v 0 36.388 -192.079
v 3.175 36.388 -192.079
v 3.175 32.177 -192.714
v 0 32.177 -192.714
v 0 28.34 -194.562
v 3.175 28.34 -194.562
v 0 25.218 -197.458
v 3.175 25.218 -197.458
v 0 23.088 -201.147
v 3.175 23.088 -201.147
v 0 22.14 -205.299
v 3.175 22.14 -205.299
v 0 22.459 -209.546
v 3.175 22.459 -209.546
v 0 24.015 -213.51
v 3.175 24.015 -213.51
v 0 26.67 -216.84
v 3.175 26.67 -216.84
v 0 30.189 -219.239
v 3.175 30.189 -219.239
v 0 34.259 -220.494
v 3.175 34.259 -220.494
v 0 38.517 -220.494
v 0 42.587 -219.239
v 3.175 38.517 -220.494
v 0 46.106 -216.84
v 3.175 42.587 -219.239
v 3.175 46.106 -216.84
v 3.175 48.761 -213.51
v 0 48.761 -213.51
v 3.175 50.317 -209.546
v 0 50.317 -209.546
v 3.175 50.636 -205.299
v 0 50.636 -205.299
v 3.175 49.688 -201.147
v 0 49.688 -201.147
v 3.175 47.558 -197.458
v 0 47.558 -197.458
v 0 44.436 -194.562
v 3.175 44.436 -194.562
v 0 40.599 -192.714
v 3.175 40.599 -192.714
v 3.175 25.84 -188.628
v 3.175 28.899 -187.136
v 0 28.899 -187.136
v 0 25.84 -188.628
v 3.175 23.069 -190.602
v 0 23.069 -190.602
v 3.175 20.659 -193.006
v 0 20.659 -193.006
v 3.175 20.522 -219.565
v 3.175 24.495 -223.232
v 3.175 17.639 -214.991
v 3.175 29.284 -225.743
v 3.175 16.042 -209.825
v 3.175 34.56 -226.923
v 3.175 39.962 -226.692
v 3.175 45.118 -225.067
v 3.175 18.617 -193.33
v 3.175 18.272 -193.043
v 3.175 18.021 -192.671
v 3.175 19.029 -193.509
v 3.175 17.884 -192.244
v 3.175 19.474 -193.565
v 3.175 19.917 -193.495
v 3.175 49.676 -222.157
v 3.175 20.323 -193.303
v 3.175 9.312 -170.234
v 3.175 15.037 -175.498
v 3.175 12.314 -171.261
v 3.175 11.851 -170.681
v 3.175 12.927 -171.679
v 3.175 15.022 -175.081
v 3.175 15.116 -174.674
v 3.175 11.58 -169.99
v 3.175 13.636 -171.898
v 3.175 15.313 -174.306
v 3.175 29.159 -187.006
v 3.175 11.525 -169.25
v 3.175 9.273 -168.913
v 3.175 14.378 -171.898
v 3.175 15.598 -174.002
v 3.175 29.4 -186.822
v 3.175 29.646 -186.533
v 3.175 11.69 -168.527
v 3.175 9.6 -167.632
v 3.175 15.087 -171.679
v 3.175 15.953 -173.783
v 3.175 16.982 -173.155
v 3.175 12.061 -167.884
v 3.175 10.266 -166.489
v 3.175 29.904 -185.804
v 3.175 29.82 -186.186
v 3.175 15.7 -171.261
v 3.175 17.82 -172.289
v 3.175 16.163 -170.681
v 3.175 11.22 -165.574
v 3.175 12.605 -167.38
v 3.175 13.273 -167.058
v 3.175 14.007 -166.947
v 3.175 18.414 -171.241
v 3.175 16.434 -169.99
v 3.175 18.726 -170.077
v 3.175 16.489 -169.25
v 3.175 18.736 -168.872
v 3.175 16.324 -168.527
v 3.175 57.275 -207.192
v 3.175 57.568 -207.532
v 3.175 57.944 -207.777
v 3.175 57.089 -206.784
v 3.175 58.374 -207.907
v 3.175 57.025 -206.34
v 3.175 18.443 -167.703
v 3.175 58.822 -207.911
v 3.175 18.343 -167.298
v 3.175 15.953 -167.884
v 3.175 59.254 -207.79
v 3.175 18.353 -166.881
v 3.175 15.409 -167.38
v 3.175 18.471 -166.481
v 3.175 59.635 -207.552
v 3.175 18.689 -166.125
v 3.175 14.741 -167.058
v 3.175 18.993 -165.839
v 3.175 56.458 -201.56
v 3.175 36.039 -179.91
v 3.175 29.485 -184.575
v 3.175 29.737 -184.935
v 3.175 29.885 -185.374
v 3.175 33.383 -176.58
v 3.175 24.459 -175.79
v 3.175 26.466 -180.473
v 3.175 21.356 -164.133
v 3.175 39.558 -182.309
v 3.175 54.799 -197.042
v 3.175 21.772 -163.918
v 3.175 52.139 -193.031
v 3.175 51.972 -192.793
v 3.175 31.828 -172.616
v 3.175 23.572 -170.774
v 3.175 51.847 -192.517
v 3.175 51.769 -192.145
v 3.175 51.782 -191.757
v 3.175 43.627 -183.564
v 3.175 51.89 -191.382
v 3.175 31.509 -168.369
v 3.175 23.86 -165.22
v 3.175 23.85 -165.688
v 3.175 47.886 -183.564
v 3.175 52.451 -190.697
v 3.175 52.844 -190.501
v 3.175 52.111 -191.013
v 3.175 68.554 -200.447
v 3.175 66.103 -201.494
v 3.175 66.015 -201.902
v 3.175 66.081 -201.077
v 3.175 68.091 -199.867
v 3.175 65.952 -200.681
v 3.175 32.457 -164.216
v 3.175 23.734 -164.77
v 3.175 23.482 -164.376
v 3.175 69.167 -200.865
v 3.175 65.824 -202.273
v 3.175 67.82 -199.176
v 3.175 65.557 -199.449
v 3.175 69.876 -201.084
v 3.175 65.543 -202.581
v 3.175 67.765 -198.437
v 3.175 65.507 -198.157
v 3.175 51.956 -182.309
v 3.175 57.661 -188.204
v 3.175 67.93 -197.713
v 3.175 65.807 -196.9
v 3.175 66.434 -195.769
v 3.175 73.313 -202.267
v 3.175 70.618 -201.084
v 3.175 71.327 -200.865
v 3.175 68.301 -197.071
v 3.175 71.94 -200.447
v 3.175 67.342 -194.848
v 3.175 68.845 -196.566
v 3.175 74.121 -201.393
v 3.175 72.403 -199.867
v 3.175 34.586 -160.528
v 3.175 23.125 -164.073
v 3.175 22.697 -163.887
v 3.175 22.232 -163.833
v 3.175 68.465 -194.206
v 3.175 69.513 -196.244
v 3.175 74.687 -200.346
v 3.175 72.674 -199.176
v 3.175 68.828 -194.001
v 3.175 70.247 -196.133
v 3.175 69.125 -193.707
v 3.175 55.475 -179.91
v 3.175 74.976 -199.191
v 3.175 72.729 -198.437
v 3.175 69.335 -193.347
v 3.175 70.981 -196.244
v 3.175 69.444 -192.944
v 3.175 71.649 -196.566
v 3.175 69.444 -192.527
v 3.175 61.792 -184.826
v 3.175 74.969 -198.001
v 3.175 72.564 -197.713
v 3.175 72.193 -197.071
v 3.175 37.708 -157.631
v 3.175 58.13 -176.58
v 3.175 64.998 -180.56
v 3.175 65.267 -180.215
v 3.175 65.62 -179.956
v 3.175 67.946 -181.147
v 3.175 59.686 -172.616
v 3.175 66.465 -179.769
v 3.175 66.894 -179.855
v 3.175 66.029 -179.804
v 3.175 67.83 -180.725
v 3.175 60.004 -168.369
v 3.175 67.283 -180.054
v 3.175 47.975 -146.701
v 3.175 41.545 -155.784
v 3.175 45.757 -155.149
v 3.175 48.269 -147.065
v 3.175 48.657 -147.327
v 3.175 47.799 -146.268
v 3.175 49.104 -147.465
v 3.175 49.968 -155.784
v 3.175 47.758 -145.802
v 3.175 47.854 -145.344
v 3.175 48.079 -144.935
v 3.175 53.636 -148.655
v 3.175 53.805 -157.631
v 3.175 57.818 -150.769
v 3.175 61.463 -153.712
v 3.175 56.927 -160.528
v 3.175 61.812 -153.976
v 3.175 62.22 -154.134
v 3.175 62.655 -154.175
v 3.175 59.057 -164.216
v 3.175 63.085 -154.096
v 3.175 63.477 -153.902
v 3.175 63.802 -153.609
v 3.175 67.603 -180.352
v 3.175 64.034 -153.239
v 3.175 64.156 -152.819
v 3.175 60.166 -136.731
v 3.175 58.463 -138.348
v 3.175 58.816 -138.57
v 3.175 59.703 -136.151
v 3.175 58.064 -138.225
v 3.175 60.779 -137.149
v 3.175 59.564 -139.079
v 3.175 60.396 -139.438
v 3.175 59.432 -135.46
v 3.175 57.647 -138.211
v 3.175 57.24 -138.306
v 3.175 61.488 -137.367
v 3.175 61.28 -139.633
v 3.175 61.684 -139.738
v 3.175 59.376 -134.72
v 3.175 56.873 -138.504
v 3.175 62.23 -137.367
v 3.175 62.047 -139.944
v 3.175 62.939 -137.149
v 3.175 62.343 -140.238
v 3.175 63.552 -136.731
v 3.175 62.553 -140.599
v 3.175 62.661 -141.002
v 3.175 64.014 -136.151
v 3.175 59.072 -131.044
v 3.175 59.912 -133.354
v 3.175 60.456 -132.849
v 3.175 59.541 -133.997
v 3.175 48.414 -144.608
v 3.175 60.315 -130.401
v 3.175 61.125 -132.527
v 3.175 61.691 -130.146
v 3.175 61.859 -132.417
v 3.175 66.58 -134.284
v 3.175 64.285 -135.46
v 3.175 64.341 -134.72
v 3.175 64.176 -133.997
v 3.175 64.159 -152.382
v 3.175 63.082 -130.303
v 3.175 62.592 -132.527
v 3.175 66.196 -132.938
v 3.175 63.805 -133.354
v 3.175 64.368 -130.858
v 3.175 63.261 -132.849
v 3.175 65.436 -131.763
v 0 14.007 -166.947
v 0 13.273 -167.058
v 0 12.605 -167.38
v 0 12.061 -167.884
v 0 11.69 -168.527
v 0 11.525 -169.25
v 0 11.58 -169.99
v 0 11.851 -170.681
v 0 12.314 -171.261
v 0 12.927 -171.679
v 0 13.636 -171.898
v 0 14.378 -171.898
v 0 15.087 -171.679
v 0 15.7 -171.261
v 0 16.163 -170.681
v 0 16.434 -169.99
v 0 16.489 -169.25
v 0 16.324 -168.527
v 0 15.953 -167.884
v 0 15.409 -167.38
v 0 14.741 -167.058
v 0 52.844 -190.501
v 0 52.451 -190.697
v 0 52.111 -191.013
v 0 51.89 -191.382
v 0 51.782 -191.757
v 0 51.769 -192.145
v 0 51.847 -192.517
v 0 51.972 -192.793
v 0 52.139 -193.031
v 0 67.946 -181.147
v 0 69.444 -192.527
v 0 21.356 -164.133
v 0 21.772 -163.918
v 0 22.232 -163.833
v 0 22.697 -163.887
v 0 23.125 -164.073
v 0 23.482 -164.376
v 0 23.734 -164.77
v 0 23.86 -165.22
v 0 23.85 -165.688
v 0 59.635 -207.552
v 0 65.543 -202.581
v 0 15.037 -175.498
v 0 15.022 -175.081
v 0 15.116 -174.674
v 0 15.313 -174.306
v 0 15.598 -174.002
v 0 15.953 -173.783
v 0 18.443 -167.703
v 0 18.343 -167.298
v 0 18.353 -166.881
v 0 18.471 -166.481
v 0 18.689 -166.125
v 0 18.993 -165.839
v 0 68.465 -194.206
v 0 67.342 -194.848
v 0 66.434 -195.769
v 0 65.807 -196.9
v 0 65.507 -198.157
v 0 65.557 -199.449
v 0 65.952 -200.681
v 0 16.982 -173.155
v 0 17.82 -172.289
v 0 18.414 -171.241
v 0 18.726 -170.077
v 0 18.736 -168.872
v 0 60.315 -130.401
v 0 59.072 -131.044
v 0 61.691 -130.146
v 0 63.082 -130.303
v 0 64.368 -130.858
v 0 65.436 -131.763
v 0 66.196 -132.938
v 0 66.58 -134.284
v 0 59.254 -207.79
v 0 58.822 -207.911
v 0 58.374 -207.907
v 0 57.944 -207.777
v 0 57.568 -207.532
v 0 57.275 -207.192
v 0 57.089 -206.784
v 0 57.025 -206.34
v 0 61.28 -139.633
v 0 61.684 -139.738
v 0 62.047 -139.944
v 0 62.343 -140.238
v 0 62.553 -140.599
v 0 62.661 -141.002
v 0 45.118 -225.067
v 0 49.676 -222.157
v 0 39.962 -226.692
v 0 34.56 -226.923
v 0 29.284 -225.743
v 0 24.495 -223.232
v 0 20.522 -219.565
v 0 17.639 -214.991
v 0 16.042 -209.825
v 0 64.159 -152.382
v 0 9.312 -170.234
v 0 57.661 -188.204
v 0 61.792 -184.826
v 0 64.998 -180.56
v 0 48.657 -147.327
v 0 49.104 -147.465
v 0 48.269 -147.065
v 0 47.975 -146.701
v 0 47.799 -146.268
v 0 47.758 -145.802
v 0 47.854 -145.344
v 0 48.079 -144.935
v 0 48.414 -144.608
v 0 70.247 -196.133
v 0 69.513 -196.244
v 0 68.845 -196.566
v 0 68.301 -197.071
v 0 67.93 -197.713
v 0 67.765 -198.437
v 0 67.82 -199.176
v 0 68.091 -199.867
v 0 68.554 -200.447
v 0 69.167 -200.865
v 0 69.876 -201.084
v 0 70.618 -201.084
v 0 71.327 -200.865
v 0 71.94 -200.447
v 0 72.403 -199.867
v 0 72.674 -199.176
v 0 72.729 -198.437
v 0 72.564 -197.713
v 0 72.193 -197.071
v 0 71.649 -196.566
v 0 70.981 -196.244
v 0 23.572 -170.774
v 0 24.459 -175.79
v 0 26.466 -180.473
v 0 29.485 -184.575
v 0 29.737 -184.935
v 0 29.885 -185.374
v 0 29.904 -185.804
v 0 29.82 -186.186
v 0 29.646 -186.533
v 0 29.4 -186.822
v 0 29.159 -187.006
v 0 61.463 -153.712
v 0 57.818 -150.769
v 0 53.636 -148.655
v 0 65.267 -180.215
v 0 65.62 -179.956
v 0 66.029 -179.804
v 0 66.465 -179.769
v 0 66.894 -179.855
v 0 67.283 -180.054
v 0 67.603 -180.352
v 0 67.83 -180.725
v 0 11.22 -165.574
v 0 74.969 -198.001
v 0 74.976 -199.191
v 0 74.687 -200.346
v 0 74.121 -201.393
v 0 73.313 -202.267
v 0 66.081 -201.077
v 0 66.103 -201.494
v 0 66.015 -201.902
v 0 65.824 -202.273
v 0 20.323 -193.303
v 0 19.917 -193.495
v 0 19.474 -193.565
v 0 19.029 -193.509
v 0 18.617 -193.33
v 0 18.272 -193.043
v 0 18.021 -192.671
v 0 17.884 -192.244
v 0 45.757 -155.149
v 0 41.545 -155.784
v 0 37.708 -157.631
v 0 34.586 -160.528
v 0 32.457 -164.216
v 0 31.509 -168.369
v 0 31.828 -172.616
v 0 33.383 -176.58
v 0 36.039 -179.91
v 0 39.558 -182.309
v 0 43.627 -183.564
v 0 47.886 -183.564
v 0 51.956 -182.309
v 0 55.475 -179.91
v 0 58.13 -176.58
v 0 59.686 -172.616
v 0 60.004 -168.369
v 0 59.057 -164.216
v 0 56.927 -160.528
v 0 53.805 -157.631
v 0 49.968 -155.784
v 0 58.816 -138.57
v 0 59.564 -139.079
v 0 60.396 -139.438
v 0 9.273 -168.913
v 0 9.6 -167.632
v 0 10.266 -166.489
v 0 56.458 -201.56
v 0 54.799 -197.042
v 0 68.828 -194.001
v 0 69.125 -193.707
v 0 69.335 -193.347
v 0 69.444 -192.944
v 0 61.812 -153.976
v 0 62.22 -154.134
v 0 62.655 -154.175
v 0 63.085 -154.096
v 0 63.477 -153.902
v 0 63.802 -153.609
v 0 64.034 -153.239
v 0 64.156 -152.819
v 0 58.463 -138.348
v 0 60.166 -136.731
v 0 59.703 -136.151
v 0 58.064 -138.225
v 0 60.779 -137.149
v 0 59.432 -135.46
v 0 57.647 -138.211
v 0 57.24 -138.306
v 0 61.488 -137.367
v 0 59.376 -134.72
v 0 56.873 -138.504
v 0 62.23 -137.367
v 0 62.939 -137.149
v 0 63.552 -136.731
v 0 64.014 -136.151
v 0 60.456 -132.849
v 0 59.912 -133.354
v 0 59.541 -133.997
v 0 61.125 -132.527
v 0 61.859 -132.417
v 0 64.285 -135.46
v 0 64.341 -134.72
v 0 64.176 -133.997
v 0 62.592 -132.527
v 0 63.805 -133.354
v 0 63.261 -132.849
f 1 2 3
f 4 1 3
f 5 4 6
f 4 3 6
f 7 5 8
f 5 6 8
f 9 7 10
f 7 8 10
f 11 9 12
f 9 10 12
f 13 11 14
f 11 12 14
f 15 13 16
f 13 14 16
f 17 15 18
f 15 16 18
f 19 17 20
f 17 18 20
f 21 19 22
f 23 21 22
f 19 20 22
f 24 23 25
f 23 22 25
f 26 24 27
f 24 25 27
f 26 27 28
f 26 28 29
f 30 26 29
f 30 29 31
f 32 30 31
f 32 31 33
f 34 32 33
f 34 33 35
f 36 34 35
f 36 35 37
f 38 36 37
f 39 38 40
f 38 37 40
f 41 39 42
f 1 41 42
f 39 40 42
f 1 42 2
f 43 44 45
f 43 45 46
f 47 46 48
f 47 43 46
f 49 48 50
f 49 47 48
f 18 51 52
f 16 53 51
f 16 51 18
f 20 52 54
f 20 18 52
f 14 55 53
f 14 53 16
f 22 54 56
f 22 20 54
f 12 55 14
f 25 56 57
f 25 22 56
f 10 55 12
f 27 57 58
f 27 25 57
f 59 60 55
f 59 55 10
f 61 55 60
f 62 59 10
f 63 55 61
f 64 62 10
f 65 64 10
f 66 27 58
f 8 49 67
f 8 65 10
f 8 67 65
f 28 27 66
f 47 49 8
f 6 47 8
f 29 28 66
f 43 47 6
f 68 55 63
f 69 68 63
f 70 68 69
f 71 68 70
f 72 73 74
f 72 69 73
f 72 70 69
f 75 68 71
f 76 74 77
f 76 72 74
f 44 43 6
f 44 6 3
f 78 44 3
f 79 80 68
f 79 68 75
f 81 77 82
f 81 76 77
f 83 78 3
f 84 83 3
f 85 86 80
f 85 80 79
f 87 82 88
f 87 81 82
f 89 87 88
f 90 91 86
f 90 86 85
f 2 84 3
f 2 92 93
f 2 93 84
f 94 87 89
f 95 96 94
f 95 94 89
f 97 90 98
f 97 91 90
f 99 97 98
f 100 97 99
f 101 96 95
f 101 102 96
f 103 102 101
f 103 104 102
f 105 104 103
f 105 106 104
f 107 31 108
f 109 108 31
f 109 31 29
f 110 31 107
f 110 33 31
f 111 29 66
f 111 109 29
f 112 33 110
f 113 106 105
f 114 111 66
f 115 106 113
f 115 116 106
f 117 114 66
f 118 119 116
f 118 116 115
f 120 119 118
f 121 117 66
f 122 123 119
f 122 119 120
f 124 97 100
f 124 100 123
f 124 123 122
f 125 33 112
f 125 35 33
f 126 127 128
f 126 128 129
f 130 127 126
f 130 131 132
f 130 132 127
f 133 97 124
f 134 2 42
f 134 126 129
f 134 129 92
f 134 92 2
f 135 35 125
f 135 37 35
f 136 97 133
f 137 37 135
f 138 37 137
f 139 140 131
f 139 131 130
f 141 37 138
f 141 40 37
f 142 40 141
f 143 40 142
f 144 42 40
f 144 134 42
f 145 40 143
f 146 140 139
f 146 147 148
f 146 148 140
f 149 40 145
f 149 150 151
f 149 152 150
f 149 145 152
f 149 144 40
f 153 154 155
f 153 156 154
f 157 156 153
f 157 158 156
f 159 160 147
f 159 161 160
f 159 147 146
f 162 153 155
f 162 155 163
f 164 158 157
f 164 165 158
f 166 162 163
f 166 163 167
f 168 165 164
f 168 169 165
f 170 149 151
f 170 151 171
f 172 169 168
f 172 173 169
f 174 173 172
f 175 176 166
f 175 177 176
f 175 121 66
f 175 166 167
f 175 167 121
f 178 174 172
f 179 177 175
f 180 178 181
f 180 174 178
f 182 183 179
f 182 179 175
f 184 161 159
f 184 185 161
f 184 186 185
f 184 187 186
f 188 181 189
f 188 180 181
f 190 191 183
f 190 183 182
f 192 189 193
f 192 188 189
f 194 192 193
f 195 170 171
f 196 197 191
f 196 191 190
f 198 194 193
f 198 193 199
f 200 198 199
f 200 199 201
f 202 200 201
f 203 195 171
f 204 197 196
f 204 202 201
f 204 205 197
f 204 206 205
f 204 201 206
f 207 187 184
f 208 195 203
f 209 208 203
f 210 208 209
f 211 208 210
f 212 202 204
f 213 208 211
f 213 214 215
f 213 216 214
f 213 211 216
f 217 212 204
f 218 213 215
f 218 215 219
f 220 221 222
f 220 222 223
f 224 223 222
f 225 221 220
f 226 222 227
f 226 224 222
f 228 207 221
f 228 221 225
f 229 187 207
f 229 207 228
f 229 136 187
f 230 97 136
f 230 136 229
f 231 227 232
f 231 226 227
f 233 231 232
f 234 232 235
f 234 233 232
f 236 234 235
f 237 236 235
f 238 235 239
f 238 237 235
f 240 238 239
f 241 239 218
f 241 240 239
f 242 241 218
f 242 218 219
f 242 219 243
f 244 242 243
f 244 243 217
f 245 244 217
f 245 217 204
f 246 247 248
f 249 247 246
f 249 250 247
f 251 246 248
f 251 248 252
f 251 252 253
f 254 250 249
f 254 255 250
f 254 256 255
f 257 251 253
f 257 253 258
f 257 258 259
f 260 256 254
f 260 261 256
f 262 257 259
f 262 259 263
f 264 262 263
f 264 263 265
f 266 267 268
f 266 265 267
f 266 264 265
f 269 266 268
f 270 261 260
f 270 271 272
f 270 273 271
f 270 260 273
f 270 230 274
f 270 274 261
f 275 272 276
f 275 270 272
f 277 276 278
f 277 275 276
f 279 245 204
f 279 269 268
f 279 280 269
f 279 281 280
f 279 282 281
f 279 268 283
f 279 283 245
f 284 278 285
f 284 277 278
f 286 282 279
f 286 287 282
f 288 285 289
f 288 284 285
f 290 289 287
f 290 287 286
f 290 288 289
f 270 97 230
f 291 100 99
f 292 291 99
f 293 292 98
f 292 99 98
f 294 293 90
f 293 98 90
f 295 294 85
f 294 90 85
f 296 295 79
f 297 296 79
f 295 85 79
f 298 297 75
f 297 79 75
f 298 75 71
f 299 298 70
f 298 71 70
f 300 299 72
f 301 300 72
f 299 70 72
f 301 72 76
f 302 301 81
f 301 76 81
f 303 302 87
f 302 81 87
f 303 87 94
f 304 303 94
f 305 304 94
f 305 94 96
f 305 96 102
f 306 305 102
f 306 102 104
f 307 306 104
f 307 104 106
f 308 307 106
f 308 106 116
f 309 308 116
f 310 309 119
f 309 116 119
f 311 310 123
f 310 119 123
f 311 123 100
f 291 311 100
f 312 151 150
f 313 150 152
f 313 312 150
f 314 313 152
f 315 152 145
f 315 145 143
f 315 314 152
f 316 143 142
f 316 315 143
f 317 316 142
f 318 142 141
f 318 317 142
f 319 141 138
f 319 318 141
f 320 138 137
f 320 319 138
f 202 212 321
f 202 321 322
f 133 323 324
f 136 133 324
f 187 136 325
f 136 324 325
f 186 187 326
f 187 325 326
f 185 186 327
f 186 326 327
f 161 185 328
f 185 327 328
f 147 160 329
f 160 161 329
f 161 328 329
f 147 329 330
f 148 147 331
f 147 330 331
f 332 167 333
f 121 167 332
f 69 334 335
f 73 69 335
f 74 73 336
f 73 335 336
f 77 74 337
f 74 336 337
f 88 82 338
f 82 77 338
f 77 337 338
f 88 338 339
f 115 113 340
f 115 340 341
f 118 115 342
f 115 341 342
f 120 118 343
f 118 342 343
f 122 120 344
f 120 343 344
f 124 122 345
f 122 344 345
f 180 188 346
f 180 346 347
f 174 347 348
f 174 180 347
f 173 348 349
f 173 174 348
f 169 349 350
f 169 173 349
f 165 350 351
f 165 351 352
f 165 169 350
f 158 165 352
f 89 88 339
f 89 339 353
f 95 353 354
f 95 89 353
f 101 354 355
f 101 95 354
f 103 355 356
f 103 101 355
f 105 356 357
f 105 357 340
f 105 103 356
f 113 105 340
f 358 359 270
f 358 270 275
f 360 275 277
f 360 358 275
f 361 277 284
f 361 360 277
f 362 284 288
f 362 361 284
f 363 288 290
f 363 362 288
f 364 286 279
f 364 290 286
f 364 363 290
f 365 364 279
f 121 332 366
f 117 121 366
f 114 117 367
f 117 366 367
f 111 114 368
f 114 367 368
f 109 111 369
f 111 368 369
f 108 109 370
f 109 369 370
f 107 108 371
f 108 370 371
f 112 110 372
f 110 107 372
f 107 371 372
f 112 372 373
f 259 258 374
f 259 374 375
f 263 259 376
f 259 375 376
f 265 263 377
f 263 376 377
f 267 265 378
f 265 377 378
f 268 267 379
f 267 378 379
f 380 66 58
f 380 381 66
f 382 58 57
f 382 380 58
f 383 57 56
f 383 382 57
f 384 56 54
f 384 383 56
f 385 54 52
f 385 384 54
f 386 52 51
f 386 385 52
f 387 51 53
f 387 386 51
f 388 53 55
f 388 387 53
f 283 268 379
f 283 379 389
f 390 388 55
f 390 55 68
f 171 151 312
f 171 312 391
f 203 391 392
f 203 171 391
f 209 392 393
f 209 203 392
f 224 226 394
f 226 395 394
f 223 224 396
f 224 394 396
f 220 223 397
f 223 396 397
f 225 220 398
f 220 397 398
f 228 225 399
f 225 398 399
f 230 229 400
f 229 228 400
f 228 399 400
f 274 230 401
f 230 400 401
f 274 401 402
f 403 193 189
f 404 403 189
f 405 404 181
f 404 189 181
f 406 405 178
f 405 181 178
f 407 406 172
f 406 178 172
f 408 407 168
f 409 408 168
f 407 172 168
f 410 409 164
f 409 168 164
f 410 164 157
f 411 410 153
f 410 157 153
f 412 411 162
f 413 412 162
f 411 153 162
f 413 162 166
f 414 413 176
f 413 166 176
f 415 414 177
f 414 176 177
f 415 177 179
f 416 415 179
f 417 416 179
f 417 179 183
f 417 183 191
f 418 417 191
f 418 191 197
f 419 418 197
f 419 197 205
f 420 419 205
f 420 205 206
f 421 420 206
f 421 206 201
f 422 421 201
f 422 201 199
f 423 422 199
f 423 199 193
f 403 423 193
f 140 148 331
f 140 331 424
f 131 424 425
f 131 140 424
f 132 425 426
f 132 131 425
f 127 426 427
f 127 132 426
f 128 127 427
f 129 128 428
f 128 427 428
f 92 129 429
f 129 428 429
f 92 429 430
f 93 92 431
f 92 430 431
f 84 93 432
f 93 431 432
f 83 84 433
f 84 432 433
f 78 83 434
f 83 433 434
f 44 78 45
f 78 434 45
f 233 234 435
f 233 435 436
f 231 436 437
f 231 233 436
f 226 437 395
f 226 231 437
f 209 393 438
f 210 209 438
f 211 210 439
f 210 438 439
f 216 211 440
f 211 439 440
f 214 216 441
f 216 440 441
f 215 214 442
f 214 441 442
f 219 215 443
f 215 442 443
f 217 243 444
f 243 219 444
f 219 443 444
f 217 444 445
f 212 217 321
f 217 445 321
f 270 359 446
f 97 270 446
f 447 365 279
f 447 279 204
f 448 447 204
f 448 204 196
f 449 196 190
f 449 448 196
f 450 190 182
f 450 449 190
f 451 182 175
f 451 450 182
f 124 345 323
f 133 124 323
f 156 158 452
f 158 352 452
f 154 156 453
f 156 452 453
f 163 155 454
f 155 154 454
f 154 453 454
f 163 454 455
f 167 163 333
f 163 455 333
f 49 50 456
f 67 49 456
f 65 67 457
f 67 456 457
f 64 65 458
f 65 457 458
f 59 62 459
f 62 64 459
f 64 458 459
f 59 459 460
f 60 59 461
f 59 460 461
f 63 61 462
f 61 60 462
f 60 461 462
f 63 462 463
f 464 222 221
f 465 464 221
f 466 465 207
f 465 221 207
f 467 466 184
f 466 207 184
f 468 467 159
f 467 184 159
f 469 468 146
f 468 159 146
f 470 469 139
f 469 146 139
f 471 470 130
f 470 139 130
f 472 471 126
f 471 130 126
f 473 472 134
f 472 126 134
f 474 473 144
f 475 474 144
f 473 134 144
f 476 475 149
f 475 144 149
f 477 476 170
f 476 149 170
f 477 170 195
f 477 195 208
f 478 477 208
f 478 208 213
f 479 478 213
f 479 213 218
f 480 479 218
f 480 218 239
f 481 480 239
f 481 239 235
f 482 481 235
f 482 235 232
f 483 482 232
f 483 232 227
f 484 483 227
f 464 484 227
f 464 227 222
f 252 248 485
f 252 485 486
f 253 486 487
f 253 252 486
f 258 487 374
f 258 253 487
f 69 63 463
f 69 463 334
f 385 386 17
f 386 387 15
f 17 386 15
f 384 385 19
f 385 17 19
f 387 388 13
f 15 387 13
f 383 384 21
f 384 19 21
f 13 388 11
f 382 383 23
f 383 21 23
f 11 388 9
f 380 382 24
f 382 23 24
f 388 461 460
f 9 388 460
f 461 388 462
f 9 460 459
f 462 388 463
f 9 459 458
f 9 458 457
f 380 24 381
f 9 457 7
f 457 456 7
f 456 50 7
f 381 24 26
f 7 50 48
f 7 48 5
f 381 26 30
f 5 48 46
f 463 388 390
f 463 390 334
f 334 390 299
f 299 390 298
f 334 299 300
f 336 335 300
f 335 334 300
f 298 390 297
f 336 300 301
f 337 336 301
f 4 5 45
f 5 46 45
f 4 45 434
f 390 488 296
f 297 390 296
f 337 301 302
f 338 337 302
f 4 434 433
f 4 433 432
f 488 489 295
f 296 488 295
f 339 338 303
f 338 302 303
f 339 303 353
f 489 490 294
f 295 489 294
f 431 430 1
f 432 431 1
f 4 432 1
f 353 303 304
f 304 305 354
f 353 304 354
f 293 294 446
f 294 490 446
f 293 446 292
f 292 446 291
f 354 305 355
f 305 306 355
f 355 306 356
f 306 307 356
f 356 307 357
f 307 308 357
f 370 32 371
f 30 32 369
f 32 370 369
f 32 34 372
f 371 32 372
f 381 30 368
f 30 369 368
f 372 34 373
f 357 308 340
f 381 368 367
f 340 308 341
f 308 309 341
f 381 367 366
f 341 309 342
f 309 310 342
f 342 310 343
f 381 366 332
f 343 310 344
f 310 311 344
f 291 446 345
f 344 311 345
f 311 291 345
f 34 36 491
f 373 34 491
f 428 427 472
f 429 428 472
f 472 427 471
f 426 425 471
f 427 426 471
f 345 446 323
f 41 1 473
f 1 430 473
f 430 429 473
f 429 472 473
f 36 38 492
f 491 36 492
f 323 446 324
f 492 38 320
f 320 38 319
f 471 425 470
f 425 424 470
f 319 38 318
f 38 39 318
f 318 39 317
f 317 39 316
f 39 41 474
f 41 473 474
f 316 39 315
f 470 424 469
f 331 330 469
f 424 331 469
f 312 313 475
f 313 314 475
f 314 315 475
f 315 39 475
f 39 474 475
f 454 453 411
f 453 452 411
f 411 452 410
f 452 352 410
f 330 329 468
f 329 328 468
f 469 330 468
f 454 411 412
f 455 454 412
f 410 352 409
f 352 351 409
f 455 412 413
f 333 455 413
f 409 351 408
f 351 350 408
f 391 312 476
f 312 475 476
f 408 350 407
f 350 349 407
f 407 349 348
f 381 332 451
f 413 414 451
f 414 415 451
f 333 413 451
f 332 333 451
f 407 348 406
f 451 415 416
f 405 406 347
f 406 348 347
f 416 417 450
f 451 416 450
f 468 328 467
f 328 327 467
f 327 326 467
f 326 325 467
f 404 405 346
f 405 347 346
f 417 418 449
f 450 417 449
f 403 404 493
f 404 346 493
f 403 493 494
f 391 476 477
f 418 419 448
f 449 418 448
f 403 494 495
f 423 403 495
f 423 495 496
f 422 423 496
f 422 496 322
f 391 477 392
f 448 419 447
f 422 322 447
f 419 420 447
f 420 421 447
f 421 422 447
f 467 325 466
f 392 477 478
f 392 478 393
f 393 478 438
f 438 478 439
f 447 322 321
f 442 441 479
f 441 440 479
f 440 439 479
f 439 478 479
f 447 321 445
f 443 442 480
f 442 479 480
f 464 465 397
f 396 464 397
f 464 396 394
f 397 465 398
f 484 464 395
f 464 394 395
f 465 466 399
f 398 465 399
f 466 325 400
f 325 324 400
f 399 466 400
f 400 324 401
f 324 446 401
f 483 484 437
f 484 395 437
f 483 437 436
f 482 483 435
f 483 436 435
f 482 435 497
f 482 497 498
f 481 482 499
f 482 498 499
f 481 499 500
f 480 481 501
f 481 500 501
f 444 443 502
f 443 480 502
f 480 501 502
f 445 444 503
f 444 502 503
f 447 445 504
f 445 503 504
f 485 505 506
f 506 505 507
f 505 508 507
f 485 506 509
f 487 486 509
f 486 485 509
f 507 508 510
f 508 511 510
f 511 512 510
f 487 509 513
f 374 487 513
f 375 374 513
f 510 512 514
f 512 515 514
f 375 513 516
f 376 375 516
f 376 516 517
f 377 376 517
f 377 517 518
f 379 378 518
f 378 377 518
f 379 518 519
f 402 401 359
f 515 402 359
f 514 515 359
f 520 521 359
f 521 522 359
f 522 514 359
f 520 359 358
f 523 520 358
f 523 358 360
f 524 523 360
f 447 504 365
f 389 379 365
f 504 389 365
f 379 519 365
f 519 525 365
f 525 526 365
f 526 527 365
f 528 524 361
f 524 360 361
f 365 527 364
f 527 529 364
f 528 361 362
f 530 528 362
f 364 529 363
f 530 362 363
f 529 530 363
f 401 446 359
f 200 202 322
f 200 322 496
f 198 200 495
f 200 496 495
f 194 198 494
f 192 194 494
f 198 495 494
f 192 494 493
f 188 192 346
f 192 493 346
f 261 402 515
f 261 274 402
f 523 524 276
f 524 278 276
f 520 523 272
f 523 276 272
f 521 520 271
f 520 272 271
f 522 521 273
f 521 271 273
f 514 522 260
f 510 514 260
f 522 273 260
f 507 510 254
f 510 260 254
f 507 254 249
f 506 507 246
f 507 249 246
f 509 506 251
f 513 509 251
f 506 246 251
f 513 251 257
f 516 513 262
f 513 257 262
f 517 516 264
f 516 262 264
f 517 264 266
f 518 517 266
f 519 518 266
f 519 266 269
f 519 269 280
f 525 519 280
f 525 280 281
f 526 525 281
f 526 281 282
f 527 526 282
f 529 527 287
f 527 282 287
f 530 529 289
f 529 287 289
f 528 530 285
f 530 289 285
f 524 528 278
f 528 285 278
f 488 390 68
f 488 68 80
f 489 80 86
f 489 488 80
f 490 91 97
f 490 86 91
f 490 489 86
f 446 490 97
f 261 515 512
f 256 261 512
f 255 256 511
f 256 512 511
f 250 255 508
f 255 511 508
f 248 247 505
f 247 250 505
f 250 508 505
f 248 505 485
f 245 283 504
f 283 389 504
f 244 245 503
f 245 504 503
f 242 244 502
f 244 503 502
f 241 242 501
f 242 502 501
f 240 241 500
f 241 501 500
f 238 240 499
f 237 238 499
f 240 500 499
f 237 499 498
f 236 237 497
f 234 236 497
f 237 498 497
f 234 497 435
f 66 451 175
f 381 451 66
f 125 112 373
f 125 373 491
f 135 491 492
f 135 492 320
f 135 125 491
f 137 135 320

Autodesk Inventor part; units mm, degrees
ref_plane "YZ Plane" through (0, 0, 0) normal (1, 0, 0) x (0, 1, 0)
ref_plane "XZ Plane" through (0, 0, 0) normal (0, 1, 0) x (-1, 0, 0)
ref_plane "XY Plane" through (0, 0, 0) normal (0, 0, 1) x (1, 0, 0)
sketch "Sketch1" plane through (0, 0, 0) normal (1, 0, 0) x (0, 1, 0)
  line L0 (0, -278.2902) -> (0, 46.3817) construction
  line L1 (36.388, -206.3665) -> (0, 0) construction
  arc A0 (16.0424, -209.8254) -> (49.6755, -222.1573) centre (36.388, -206.3665) ccw
  line L2 (61.8586, -134.906) -> (45.7568, -169.4363) construction
  arc A1 (66.5803, -134.2844) -> (59.0717, -131.044) centre (61.8586, -134.906) ccw
  arc A2 (73.3134, -202.2667) -> (74.9688, -198.001) centre (70.247, -198.6226) ccw
  arc A3 (11.22, -165.5743) -> (9.3117, -170.2345) centre (14.0068, -169.4363) ccw
  line L3 (66.5803, -134.2844) -> (74.9688, -198.001)
  line L4 (73.3134, -202.2667) -> (49.6755, -222.1573)
  line L5 (16.0424, -209.8254) -> (9.3117, -170.2345)
  line L6 (70.247, -198.6226) -> (45.7568, -169.4363) construction
  line L7 (59.0717, -131.044) -> (11.22, -165.5743)
  line L8 (45.7568, -169.4363) -> (14.0068, -169.4363) construction
  dimension "d8" = 209.55
  dimension "d9" = 175.506
  dimension "d11" = 10
  dimension "d12" = 20.6375
  dimension "d13" = 38.1
  dimension "d14" = 25
  dimension "d19" = 4.7625
  dimension "d37" = 40
  dimension "d39" = 90
  dimension "d40" = 31.75
  dimension "d41" = 38.1
extrude "Plate1" add sketch "Sketch1" along normal blind 3.175
hole "Hole1" at (0, 61.8586, -134.906) at (0, 14.0068, -169.4363) at (0, 70.247, -198.6226) direction (1, 0, 0) diameter 4.9784 end through all clearance for "Flat Head Machine Screw (82)" size "#10" standard "Ansi Unified Screw Threads"
hole "Hole2" at (0, 36.388, -206.3665) at (0, 45.7568, -169.4363) direction (1, 0, 0) diameter 28.575 end through all
sketch "Sketch2" plane through (3.175, 0, 0) normal (1, 0, 0) x (0, 0, -1)
  circle A0 centre (169.4363, 45.7568) radius 14.2875 projected
  circle A1 centre (206.3665, 36.388) radius 14.2875 projected
  circle A2 centre (198.6226, 70.247) radius 2.4892 projected
  circle A3 centre (169.4363, 14.0068) radius 2.4892 projected
  circle A4 centre (134.906, 61.8586) radius 2.4892 projected
  arc A5 (134.2844, 66.5803) -> (131.044, 59.0717) centre (134.906, 61.8586) ccw projected
  line L0 (165.5743, 11.22) -> (131.044, 59.0717) projected
  arc A6 (165.5743, 11.22) -> (170.2345, 9.3117) centre (169.4363, 14.0068) ccw projected
  line L1 (209.8254, 16.0424) -> (170.2345, 9.3117) projected
  arc A7 (209.8254, 16.0424) -> (222.1573, 49.6755) centre (206.3665, 36.388) ccw projected
  line L2 (202.2667, 73.3134) -> (222.1573, 49.6755) projected
  arc A8 (202.2667, 73.3134) -> (198.001, 74.9688) centre (198.6226, 70.247) ccw projected
  line L3 (134.2844, 66.5803) -> (198.001, 74.9688) projected
  line L4 (134.906, 61.8586) -> (198.6226, 70.247)
  line L5 (198.6226, 70.247) -> (218.5132, 46.6091)
  arc A9 (209.0271, 20.7375) -> (218.5132, 46.6091) centre (206.3665, 36.388) ccw
  line L6 (209.0271, 20.7375) -> (169.4363, 14.0068)
  line L7 (169.4363, 14.0068) -> (134.906, 61.8586)
  circle A10 centre (134.906, 61.8586) radius 4.7625
  circle A11 centre (198.6226, 70.247) radius 4.7625
  circle A12 centre (169.4363, 14.0068) radius 4.7625
  circle A13 centre (169.4363, 45.7568) radius 22.225
  circle A14 centre (206.3665, 36.388) radius 20.6375
  point P0 (0, 0)
  point P1 (196.0269, 18.5274)
  point P2 (186.3547, 31.3444)
  point P3 (161.5078, 24.9941)
  point P4 (166.6495, 17.8688)
  point P5 (174.1315, 14.805)
  point P6 (191.1791, 50.3612)
  point P7 (210.0229, 56.699)
  point P8 (201.689, 66.603)
  point P9 (193.9009, 69.6254)
  point P10 (175.3438, 67.1823)
  point P11 (147.233, 44.776)
  point P12 (158.1848, 64.9233)
  point P13 (139.6278, 62.4802)
  point P14 (137.6928, 57.9966)
  dimension "d42" = 4.7625
  dimension "d44" = 41.275
  dimension "d45" = 44.45
extrude "Cut1" cut sketch "Sketch2" against normal blind 3.175 contours A11 L5 A14 A13 L4 | A13 L7 A10 L4 | A14 L6 A12 L7 A13
fillet "Corner Round1" radius 1.5875 14 edges at (1.5875, 44.776, -147.233) (1.5875, 64.9233, -158.1848) (1.5875, 57.9966, -137.6928) (1.5875, 56.699, -210.0229) (1.5875, 31.3444, -186.3547) (1.5875, 14.805, -174.1315) (1.5875, 18.5274, -196.0269) (1.5875, 50.3612, -191.1791) (1.5875, 62.4802, -139.6278) (1.5875, 69.6254, -193.9009) (1.5875, 66.603, -201.689) (1.5875, 67.1823, -175.3438) (1.5875, 17.8688, -166.6495) (1.5875, 24.9941, -161.5078)
equation "\"d25\" = Thickness"
equation "\"d46\" = Thickness"
equation "\"d7\" = Thickness"
equation "\"BendRadius\" = Thickness"
equation "\"BendReliefWidth\" = Thickness"
equation "\"BendReliefDepth\" = 0.5 * Thickness"
equation "\"CornerReliefSize\" = 4 * Thickness"
equation "\"MinimumRemnant\" = 2 * Thickness"
equation "\"TransitionRadius\" = BendRadius"
equation "\"JacobiRadiusSize\" = BendRadius"
equation "\"GapSize\" = Thickness"
equation "\"Thickness\" = 3.175"
properties part number "PLATE,BEARING,MOUNT" material "Aluminum 3003-H16"
